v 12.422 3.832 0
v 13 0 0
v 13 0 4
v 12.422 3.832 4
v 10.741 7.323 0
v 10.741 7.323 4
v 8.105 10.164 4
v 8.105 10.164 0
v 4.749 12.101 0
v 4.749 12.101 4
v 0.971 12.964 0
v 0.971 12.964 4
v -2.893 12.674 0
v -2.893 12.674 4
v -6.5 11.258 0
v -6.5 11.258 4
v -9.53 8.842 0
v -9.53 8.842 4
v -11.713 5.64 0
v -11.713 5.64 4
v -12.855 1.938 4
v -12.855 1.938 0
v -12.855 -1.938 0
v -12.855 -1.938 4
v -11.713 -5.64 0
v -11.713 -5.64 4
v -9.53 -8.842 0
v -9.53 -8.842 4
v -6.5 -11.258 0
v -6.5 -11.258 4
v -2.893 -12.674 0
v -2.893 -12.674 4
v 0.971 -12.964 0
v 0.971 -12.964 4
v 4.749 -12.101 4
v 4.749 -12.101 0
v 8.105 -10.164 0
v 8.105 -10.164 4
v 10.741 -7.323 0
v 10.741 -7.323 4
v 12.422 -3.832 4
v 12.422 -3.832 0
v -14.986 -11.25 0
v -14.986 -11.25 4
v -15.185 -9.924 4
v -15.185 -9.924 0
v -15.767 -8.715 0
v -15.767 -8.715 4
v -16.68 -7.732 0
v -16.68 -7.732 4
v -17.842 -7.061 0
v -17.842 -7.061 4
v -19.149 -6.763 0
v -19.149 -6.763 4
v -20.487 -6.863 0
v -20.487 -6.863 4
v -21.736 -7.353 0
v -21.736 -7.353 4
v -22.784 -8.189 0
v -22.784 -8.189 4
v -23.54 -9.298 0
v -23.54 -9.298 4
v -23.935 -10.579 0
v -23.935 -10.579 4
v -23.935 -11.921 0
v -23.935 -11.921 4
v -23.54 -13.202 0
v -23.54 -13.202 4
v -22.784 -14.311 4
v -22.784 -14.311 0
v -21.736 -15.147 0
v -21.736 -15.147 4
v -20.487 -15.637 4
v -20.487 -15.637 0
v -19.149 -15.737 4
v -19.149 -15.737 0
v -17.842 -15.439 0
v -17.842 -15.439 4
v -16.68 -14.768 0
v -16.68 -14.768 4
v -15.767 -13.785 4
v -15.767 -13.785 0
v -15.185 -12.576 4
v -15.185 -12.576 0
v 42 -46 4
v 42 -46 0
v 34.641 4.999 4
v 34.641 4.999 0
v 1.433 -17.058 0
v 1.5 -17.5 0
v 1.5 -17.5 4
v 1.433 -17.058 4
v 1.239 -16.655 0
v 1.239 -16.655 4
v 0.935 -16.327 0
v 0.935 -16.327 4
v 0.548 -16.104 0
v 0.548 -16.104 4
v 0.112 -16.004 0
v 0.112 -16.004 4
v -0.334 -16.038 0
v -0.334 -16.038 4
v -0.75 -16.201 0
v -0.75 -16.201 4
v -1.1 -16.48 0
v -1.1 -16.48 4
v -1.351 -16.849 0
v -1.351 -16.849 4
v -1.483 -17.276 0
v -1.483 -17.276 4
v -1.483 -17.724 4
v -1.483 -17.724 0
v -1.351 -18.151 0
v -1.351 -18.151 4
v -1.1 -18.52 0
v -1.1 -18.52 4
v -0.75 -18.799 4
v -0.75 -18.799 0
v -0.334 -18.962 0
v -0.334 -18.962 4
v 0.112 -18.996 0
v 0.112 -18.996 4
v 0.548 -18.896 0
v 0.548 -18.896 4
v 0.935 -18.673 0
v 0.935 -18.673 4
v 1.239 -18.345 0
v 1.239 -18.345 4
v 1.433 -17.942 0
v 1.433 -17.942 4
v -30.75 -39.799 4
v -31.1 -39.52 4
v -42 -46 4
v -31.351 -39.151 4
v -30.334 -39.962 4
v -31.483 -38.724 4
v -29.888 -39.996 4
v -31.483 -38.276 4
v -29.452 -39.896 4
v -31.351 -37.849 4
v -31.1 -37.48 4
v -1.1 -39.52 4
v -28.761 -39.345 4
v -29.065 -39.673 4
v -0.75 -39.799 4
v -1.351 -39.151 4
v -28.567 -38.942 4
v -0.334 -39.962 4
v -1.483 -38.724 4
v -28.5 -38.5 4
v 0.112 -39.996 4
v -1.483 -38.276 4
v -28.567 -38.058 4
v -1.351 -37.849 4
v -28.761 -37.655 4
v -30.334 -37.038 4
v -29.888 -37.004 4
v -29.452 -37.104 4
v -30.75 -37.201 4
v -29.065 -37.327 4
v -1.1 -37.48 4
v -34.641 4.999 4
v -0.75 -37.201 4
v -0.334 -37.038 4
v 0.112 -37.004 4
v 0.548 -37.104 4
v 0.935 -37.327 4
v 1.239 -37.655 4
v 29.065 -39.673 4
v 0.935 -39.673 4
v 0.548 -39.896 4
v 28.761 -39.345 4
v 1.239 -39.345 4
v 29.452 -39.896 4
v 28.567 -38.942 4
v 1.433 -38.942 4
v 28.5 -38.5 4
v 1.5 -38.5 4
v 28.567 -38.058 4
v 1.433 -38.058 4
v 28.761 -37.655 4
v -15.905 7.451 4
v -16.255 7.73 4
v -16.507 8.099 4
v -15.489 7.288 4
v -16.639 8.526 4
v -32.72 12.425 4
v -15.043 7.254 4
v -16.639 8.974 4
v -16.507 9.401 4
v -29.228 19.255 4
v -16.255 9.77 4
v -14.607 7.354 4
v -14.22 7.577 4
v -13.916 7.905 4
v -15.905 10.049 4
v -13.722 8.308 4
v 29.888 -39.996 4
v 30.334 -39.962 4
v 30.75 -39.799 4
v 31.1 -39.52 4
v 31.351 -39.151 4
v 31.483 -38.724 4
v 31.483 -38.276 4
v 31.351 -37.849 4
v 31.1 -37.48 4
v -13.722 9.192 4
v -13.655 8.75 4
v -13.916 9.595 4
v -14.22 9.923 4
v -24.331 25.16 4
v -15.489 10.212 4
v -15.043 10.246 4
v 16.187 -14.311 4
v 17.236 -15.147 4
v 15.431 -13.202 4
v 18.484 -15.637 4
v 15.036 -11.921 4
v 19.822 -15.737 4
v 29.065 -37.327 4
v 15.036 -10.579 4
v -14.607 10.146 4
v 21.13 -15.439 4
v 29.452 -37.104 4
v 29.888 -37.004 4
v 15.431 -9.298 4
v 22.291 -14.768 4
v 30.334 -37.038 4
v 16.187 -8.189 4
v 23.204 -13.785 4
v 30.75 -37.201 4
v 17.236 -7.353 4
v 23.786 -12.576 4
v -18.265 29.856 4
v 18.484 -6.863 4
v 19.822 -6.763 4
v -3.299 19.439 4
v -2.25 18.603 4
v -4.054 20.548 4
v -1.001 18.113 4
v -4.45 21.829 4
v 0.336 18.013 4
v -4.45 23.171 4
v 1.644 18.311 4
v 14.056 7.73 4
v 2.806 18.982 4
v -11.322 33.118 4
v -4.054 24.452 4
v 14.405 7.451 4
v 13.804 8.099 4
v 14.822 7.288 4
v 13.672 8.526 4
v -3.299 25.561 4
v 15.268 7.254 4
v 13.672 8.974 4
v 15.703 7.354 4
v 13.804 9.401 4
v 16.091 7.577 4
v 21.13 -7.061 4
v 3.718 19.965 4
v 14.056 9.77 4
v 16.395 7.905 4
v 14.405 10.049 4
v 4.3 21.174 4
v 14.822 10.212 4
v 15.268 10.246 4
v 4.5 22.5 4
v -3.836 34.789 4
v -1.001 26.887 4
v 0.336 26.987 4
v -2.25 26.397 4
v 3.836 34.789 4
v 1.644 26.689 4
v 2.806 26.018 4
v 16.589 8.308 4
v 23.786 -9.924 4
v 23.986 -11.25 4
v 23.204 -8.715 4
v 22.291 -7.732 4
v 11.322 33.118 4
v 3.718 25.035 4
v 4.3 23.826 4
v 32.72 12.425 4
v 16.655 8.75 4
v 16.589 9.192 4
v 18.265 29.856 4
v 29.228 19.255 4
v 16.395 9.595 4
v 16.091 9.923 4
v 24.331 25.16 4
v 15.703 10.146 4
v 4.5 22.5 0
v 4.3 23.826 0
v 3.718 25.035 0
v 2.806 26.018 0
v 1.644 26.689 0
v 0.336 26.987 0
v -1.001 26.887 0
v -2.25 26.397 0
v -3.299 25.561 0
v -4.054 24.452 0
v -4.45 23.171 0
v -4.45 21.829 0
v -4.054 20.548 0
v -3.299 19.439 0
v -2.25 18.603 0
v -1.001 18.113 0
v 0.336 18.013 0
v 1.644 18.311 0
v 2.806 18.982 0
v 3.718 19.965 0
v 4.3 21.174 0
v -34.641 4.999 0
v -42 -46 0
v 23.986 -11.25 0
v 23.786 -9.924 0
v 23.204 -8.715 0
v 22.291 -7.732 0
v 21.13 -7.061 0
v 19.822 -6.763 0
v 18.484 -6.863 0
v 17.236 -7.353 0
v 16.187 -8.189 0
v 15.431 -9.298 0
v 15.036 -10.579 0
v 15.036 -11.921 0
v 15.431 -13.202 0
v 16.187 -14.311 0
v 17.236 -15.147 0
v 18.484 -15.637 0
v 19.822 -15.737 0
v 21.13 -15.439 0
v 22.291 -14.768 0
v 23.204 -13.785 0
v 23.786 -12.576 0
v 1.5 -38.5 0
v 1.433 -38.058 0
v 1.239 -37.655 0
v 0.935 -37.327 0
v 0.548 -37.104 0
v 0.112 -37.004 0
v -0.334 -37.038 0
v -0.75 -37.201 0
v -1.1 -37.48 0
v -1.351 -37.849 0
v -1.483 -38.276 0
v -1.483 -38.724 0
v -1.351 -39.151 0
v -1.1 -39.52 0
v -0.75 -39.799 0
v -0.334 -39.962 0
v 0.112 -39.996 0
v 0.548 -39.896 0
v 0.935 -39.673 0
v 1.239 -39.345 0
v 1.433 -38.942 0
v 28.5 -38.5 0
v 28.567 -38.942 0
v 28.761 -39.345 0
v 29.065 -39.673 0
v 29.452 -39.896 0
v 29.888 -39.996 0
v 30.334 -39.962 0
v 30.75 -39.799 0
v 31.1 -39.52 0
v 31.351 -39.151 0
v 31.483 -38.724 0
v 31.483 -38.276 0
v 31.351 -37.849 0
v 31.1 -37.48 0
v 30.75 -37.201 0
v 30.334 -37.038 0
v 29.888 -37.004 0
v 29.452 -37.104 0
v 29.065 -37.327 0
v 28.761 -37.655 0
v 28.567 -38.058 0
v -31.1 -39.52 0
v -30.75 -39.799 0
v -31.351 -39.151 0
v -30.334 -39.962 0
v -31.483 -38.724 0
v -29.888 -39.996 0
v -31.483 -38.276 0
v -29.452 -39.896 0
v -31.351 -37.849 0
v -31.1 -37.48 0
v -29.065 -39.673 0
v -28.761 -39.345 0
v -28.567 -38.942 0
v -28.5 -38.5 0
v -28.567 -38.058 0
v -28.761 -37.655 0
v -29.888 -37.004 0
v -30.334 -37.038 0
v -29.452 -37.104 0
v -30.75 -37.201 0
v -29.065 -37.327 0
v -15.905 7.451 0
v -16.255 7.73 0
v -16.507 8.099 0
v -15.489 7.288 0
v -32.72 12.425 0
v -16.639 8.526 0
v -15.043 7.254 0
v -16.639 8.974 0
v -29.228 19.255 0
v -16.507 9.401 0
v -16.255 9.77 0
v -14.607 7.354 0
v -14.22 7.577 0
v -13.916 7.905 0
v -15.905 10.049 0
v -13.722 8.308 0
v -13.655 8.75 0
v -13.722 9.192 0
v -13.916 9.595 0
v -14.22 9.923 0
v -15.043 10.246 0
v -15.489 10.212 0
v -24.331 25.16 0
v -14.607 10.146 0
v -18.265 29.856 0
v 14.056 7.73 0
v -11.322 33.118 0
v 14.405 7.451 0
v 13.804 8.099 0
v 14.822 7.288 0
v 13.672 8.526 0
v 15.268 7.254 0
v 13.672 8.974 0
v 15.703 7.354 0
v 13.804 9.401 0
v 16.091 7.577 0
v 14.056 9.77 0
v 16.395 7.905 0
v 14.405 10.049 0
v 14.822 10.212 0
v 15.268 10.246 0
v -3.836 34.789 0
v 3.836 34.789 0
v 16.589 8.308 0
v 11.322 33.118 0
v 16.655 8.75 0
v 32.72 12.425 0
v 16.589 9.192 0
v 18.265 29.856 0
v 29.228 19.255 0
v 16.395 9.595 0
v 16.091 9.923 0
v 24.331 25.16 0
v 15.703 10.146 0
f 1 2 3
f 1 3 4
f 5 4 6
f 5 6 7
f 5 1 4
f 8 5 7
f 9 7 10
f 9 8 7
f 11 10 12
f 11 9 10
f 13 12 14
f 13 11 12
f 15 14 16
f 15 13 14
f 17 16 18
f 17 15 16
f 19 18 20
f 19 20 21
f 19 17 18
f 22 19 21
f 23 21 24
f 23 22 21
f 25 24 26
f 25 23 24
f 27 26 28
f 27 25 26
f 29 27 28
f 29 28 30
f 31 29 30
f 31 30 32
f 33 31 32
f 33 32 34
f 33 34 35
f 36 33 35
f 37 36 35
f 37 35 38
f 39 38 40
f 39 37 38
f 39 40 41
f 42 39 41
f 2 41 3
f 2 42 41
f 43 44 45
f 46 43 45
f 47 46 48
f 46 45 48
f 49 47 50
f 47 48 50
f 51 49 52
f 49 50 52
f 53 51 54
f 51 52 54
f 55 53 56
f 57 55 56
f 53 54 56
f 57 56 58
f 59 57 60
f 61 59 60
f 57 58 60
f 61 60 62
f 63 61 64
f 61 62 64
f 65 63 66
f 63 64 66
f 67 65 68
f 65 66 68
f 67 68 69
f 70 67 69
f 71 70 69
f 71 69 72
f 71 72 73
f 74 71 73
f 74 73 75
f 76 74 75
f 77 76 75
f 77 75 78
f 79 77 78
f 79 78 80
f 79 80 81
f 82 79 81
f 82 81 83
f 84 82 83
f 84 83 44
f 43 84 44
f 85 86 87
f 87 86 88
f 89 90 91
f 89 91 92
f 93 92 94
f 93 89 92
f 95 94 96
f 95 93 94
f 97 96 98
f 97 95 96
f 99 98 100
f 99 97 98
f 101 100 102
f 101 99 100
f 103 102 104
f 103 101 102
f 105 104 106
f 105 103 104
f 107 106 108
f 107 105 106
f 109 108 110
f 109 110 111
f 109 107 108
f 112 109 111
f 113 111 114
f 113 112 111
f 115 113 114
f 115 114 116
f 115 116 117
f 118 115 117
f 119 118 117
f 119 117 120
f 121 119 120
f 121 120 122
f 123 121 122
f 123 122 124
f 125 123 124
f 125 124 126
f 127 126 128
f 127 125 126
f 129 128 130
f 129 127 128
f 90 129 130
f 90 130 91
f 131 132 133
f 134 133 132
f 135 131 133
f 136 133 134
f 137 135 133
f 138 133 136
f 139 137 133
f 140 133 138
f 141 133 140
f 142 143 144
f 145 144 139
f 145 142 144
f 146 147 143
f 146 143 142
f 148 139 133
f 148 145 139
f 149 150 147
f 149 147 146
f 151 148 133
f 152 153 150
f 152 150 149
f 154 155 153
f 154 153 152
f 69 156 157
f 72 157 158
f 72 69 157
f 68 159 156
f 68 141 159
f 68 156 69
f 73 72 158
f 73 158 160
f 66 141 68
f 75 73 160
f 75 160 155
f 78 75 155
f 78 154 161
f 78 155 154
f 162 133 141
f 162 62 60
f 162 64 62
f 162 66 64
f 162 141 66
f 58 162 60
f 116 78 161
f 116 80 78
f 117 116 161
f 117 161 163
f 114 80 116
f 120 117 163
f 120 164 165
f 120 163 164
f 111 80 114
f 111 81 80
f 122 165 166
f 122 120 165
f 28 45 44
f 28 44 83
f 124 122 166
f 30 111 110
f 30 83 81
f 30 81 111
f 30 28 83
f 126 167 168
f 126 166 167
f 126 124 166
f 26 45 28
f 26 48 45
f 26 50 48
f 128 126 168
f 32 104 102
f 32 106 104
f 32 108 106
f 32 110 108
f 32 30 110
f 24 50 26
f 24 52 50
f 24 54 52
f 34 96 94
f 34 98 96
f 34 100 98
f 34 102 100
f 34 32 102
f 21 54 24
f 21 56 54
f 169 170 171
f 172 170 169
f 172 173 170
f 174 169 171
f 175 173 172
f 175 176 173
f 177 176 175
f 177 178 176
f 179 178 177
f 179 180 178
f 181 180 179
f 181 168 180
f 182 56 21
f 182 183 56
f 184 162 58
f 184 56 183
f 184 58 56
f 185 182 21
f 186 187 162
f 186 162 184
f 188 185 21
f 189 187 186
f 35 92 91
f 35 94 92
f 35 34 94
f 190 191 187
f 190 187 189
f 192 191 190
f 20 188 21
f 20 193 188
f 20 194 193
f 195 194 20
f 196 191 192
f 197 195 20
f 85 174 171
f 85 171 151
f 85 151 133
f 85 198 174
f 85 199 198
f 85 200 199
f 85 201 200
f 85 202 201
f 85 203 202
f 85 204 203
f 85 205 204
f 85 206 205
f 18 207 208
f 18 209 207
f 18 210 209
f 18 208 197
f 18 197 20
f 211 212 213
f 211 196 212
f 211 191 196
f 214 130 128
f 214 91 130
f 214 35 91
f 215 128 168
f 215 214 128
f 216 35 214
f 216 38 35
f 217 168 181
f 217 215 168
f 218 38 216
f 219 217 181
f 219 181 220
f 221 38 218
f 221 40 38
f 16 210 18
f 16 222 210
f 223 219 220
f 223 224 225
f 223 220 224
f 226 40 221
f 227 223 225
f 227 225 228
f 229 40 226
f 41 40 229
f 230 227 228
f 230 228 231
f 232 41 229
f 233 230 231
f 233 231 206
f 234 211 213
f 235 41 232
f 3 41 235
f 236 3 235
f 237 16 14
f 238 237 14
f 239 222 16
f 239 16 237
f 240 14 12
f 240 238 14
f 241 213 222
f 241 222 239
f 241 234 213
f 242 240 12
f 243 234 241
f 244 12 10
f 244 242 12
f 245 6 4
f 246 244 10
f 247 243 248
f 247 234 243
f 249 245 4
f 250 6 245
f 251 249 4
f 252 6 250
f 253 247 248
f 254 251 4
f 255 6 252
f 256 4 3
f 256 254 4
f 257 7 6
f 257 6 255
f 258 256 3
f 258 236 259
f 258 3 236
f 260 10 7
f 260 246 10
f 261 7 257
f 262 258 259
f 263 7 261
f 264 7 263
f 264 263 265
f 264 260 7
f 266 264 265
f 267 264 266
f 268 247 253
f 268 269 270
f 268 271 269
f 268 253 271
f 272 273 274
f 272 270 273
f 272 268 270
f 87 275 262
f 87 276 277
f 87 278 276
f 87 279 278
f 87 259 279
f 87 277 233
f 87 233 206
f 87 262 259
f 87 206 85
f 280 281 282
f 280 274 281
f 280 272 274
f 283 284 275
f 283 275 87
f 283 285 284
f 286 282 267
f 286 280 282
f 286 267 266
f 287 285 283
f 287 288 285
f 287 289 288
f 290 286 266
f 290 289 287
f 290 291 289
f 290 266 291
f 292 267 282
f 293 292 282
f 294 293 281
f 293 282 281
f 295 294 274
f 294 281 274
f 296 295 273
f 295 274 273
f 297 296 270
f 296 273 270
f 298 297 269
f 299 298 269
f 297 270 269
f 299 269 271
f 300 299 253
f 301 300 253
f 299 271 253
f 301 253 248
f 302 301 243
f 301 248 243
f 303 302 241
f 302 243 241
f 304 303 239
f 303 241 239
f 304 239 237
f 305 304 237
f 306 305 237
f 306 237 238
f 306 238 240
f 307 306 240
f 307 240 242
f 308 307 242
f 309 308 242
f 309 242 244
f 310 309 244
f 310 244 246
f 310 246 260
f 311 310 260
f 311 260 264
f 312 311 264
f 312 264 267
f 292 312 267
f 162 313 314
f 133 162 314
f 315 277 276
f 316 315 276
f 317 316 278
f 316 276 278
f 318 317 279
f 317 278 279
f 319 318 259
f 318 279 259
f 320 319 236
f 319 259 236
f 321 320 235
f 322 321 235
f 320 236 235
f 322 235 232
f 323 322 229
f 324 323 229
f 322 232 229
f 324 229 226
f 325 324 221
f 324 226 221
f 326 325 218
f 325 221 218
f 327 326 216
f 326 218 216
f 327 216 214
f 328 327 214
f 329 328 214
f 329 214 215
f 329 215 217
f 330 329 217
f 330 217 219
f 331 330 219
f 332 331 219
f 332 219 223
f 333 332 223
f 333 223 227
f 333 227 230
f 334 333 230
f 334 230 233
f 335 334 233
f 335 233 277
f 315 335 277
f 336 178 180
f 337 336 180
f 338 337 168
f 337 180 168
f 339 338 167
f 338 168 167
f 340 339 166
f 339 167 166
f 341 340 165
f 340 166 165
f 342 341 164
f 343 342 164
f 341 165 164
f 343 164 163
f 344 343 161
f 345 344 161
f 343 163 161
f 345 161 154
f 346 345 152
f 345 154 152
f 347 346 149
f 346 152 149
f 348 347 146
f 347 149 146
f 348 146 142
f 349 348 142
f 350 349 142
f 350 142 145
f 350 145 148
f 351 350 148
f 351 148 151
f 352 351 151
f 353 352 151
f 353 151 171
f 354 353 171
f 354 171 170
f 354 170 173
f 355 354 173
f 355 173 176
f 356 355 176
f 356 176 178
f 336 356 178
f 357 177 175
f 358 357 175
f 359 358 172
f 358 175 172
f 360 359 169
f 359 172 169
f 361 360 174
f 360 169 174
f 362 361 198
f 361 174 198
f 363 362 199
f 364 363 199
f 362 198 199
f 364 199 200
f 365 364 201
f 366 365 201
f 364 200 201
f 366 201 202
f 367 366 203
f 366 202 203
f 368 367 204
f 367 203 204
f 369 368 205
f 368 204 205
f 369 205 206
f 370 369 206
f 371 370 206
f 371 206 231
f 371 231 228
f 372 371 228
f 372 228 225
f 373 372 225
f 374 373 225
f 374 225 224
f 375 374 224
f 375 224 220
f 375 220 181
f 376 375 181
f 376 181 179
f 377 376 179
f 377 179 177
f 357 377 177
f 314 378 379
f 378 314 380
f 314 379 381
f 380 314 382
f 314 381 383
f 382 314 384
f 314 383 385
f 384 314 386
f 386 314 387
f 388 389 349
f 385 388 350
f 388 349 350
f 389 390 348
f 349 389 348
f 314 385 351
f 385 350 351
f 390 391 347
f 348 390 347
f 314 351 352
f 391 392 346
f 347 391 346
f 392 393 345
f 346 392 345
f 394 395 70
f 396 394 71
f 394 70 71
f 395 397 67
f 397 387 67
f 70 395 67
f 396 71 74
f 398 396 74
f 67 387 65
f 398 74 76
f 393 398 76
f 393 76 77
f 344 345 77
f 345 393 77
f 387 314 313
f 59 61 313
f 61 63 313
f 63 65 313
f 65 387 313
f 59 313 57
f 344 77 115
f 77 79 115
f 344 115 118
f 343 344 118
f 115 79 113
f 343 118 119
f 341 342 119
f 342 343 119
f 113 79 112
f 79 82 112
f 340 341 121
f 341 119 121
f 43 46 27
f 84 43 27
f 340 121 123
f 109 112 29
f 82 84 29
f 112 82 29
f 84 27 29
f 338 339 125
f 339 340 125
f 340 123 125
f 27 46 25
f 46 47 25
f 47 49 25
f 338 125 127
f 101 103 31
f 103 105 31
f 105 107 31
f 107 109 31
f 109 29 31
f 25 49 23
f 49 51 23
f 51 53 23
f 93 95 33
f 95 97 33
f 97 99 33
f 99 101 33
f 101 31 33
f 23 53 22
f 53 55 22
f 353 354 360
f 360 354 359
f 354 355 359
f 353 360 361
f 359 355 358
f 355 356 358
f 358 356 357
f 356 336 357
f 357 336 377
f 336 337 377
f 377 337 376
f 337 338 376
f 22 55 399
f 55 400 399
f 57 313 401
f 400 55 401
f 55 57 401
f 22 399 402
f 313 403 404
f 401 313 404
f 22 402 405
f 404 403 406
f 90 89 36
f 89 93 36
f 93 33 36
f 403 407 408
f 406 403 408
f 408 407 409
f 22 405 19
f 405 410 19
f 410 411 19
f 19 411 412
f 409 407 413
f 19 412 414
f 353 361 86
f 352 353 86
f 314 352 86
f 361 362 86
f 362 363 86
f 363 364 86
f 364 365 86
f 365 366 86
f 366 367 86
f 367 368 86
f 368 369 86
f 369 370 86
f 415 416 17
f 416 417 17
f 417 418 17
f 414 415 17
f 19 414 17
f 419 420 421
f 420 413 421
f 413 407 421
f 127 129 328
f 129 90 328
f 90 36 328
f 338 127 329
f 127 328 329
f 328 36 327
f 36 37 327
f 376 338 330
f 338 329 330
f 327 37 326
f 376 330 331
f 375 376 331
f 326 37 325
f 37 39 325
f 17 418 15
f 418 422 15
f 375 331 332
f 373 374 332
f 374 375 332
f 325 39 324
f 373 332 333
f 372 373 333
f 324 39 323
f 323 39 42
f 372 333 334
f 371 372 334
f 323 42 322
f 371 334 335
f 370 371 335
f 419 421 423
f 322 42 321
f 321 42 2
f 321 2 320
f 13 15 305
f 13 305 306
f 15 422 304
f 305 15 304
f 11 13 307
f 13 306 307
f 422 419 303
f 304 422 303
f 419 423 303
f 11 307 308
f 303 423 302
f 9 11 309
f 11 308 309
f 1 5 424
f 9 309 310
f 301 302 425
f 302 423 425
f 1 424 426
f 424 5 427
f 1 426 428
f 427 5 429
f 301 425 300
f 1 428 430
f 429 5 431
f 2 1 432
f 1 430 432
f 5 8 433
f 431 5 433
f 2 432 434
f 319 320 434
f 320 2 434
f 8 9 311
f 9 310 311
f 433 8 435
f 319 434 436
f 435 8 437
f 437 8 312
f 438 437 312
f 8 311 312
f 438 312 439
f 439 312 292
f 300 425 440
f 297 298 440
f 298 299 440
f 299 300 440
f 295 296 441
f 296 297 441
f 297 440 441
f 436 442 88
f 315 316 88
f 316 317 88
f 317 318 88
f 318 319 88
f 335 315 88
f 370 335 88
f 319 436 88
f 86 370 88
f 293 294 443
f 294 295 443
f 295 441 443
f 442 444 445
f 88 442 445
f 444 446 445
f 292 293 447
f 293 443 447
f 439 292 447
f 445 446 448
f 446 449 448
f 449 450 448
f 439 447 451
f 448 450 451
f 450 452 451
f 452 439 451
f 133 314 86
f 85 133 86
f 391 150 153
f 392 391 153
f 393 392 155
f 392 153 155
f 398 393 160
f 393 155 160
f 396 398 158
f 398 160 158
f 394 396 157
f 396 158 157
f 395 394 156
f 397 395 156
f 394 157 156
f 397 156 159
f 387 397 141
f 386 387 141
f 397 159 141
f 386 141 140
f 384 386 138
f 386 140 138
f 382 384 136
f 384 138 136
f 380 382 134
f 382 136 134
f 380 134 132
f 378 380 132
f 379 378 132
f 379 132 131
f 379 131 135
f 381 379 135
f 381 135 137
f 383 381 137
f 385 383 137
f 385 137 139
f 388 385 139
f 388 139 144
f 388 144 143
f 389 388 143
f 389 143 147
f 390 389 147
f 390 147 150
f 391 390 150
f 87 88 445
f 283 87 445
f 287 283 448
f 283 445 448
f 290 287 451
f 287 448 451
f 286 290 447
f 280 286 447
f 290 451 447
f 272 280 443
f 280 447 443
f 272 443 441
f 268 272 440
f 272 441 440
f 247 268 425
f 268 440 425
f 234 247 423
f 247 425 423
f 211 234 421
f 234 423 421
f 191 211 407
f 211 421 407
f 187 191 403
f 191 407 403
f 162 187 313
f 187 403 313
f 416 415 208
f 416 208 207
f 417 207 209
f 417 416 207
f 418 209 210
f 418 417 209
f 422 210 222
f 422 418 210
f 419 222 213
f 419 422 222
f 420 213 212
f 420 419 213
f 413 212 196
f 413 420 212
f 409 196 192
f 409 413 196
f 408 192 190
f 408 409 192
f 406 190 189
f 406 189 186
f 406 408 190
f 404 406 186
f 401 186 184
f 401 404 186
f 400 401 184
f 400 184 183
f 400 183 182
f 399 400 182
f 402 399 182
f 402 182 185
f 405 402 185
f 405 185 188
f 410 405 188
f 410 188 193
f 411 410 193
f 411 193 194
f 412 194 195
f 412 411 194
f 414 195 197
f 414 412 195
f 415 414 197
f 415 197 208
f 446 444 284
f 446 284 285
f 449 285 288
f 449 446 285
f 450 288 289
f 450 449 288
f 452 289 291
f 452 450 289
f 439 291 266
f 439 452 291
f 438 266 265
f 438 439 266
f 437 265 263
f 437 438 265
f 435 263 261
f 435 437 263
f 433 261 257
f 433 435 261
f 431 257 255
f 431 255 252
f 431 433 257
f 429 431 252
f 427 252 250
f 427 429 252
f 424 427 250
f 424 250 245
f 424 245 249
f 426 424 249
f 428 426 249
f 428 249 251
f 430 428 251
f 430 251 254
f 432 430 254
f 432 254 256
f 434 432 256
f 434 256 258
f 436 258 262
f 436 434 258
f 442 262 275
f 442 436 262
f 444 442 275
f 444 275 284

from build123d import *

# Parameters (mm, degrees)
SKETCH_1_R          = 13
EXTRUDE_1_DEPTH     = 4
SKETCH_2_R          = 4.5
CUT_EXTRUDE_1_DEPTH = 63.417946137
SKETCH_3_R          = 1.5
CUT_EXTRUDE_5_DEPTH = 4
SKETCH_4_R          = 1.5
CUT_EXTRUDE_6_DEPTH = 63.417946137


with BuildPart() as part:
    # 草图1 → 凸台-拉伸1 (new body)
    with BuildSketch(Plane.XY):
        with BuildLine():
            ThreePointArc((34.64123049, 4.998514795), (0, 35), (-34.64123049, 4.998514795))
            Line((-34.64123049, 4.998514795), (-42, -46))
            Line((-42, -46), (42, -46))
            Line((42, -46), (34.64123049, 4.998514795))
        make_face()
        Circle(SKETCH_1_R, mode=Mode.SUBTRACT)
    extrude(amount=EXTRUDE_1_DEPTH)

    # 草图2 → 切除-拉伸1 (cut, through all)
    with BuildSketch(Plane.XY.offset(4)):
        with Locations((0, 22.5)):
            Circle(SKETCH_2_R)
        with Locations((19.485571585, -11.25)):
            Circle(SKETCH_2_R)
        with Locations((-19.485571585, -11.25)):
            Circle(SKETCH_2_R)
    extrude(amount=-CUT_EXTRUDE_1_DEPTH, mode=Mode.SUBTRACT)

    # 草图3 → 切除-拉伸5 (cut)
    with BuildSketch(Plane.XY):
        with Locations((15.155444566, 8.75)):
            Circle(SKETCH_3_R)
        with Locations((0, -17.5)):
            Circle(SKETCH_3_R)
        with Locations((-15.155444566, 8.75)):
            Circle(SKETCH_3_R)
    extrude(amount=CUT_EXTRUDE_5_DEPTH, mode=Mode.SUBTRACT)

    # 草图4 → 切除-拉伸6 (cut, through all)
    with BuildSketch(Plane.XY.offset(4)):
        with Locations((0, -38.5)):
            Circle(SKETCH_4_R)
        with Locations((-30, -38.5)):
            Circle(SKETCH_4_R)
        with Locations(Location((30, -38.5, 0), (0, 0, 180))):
            Circle(SKETCH_4_R)
    extrude(amount=-CUT_EXTRUDE_6_DEPTH, mode=Mode.SUBTRACT)


solid = part.part
